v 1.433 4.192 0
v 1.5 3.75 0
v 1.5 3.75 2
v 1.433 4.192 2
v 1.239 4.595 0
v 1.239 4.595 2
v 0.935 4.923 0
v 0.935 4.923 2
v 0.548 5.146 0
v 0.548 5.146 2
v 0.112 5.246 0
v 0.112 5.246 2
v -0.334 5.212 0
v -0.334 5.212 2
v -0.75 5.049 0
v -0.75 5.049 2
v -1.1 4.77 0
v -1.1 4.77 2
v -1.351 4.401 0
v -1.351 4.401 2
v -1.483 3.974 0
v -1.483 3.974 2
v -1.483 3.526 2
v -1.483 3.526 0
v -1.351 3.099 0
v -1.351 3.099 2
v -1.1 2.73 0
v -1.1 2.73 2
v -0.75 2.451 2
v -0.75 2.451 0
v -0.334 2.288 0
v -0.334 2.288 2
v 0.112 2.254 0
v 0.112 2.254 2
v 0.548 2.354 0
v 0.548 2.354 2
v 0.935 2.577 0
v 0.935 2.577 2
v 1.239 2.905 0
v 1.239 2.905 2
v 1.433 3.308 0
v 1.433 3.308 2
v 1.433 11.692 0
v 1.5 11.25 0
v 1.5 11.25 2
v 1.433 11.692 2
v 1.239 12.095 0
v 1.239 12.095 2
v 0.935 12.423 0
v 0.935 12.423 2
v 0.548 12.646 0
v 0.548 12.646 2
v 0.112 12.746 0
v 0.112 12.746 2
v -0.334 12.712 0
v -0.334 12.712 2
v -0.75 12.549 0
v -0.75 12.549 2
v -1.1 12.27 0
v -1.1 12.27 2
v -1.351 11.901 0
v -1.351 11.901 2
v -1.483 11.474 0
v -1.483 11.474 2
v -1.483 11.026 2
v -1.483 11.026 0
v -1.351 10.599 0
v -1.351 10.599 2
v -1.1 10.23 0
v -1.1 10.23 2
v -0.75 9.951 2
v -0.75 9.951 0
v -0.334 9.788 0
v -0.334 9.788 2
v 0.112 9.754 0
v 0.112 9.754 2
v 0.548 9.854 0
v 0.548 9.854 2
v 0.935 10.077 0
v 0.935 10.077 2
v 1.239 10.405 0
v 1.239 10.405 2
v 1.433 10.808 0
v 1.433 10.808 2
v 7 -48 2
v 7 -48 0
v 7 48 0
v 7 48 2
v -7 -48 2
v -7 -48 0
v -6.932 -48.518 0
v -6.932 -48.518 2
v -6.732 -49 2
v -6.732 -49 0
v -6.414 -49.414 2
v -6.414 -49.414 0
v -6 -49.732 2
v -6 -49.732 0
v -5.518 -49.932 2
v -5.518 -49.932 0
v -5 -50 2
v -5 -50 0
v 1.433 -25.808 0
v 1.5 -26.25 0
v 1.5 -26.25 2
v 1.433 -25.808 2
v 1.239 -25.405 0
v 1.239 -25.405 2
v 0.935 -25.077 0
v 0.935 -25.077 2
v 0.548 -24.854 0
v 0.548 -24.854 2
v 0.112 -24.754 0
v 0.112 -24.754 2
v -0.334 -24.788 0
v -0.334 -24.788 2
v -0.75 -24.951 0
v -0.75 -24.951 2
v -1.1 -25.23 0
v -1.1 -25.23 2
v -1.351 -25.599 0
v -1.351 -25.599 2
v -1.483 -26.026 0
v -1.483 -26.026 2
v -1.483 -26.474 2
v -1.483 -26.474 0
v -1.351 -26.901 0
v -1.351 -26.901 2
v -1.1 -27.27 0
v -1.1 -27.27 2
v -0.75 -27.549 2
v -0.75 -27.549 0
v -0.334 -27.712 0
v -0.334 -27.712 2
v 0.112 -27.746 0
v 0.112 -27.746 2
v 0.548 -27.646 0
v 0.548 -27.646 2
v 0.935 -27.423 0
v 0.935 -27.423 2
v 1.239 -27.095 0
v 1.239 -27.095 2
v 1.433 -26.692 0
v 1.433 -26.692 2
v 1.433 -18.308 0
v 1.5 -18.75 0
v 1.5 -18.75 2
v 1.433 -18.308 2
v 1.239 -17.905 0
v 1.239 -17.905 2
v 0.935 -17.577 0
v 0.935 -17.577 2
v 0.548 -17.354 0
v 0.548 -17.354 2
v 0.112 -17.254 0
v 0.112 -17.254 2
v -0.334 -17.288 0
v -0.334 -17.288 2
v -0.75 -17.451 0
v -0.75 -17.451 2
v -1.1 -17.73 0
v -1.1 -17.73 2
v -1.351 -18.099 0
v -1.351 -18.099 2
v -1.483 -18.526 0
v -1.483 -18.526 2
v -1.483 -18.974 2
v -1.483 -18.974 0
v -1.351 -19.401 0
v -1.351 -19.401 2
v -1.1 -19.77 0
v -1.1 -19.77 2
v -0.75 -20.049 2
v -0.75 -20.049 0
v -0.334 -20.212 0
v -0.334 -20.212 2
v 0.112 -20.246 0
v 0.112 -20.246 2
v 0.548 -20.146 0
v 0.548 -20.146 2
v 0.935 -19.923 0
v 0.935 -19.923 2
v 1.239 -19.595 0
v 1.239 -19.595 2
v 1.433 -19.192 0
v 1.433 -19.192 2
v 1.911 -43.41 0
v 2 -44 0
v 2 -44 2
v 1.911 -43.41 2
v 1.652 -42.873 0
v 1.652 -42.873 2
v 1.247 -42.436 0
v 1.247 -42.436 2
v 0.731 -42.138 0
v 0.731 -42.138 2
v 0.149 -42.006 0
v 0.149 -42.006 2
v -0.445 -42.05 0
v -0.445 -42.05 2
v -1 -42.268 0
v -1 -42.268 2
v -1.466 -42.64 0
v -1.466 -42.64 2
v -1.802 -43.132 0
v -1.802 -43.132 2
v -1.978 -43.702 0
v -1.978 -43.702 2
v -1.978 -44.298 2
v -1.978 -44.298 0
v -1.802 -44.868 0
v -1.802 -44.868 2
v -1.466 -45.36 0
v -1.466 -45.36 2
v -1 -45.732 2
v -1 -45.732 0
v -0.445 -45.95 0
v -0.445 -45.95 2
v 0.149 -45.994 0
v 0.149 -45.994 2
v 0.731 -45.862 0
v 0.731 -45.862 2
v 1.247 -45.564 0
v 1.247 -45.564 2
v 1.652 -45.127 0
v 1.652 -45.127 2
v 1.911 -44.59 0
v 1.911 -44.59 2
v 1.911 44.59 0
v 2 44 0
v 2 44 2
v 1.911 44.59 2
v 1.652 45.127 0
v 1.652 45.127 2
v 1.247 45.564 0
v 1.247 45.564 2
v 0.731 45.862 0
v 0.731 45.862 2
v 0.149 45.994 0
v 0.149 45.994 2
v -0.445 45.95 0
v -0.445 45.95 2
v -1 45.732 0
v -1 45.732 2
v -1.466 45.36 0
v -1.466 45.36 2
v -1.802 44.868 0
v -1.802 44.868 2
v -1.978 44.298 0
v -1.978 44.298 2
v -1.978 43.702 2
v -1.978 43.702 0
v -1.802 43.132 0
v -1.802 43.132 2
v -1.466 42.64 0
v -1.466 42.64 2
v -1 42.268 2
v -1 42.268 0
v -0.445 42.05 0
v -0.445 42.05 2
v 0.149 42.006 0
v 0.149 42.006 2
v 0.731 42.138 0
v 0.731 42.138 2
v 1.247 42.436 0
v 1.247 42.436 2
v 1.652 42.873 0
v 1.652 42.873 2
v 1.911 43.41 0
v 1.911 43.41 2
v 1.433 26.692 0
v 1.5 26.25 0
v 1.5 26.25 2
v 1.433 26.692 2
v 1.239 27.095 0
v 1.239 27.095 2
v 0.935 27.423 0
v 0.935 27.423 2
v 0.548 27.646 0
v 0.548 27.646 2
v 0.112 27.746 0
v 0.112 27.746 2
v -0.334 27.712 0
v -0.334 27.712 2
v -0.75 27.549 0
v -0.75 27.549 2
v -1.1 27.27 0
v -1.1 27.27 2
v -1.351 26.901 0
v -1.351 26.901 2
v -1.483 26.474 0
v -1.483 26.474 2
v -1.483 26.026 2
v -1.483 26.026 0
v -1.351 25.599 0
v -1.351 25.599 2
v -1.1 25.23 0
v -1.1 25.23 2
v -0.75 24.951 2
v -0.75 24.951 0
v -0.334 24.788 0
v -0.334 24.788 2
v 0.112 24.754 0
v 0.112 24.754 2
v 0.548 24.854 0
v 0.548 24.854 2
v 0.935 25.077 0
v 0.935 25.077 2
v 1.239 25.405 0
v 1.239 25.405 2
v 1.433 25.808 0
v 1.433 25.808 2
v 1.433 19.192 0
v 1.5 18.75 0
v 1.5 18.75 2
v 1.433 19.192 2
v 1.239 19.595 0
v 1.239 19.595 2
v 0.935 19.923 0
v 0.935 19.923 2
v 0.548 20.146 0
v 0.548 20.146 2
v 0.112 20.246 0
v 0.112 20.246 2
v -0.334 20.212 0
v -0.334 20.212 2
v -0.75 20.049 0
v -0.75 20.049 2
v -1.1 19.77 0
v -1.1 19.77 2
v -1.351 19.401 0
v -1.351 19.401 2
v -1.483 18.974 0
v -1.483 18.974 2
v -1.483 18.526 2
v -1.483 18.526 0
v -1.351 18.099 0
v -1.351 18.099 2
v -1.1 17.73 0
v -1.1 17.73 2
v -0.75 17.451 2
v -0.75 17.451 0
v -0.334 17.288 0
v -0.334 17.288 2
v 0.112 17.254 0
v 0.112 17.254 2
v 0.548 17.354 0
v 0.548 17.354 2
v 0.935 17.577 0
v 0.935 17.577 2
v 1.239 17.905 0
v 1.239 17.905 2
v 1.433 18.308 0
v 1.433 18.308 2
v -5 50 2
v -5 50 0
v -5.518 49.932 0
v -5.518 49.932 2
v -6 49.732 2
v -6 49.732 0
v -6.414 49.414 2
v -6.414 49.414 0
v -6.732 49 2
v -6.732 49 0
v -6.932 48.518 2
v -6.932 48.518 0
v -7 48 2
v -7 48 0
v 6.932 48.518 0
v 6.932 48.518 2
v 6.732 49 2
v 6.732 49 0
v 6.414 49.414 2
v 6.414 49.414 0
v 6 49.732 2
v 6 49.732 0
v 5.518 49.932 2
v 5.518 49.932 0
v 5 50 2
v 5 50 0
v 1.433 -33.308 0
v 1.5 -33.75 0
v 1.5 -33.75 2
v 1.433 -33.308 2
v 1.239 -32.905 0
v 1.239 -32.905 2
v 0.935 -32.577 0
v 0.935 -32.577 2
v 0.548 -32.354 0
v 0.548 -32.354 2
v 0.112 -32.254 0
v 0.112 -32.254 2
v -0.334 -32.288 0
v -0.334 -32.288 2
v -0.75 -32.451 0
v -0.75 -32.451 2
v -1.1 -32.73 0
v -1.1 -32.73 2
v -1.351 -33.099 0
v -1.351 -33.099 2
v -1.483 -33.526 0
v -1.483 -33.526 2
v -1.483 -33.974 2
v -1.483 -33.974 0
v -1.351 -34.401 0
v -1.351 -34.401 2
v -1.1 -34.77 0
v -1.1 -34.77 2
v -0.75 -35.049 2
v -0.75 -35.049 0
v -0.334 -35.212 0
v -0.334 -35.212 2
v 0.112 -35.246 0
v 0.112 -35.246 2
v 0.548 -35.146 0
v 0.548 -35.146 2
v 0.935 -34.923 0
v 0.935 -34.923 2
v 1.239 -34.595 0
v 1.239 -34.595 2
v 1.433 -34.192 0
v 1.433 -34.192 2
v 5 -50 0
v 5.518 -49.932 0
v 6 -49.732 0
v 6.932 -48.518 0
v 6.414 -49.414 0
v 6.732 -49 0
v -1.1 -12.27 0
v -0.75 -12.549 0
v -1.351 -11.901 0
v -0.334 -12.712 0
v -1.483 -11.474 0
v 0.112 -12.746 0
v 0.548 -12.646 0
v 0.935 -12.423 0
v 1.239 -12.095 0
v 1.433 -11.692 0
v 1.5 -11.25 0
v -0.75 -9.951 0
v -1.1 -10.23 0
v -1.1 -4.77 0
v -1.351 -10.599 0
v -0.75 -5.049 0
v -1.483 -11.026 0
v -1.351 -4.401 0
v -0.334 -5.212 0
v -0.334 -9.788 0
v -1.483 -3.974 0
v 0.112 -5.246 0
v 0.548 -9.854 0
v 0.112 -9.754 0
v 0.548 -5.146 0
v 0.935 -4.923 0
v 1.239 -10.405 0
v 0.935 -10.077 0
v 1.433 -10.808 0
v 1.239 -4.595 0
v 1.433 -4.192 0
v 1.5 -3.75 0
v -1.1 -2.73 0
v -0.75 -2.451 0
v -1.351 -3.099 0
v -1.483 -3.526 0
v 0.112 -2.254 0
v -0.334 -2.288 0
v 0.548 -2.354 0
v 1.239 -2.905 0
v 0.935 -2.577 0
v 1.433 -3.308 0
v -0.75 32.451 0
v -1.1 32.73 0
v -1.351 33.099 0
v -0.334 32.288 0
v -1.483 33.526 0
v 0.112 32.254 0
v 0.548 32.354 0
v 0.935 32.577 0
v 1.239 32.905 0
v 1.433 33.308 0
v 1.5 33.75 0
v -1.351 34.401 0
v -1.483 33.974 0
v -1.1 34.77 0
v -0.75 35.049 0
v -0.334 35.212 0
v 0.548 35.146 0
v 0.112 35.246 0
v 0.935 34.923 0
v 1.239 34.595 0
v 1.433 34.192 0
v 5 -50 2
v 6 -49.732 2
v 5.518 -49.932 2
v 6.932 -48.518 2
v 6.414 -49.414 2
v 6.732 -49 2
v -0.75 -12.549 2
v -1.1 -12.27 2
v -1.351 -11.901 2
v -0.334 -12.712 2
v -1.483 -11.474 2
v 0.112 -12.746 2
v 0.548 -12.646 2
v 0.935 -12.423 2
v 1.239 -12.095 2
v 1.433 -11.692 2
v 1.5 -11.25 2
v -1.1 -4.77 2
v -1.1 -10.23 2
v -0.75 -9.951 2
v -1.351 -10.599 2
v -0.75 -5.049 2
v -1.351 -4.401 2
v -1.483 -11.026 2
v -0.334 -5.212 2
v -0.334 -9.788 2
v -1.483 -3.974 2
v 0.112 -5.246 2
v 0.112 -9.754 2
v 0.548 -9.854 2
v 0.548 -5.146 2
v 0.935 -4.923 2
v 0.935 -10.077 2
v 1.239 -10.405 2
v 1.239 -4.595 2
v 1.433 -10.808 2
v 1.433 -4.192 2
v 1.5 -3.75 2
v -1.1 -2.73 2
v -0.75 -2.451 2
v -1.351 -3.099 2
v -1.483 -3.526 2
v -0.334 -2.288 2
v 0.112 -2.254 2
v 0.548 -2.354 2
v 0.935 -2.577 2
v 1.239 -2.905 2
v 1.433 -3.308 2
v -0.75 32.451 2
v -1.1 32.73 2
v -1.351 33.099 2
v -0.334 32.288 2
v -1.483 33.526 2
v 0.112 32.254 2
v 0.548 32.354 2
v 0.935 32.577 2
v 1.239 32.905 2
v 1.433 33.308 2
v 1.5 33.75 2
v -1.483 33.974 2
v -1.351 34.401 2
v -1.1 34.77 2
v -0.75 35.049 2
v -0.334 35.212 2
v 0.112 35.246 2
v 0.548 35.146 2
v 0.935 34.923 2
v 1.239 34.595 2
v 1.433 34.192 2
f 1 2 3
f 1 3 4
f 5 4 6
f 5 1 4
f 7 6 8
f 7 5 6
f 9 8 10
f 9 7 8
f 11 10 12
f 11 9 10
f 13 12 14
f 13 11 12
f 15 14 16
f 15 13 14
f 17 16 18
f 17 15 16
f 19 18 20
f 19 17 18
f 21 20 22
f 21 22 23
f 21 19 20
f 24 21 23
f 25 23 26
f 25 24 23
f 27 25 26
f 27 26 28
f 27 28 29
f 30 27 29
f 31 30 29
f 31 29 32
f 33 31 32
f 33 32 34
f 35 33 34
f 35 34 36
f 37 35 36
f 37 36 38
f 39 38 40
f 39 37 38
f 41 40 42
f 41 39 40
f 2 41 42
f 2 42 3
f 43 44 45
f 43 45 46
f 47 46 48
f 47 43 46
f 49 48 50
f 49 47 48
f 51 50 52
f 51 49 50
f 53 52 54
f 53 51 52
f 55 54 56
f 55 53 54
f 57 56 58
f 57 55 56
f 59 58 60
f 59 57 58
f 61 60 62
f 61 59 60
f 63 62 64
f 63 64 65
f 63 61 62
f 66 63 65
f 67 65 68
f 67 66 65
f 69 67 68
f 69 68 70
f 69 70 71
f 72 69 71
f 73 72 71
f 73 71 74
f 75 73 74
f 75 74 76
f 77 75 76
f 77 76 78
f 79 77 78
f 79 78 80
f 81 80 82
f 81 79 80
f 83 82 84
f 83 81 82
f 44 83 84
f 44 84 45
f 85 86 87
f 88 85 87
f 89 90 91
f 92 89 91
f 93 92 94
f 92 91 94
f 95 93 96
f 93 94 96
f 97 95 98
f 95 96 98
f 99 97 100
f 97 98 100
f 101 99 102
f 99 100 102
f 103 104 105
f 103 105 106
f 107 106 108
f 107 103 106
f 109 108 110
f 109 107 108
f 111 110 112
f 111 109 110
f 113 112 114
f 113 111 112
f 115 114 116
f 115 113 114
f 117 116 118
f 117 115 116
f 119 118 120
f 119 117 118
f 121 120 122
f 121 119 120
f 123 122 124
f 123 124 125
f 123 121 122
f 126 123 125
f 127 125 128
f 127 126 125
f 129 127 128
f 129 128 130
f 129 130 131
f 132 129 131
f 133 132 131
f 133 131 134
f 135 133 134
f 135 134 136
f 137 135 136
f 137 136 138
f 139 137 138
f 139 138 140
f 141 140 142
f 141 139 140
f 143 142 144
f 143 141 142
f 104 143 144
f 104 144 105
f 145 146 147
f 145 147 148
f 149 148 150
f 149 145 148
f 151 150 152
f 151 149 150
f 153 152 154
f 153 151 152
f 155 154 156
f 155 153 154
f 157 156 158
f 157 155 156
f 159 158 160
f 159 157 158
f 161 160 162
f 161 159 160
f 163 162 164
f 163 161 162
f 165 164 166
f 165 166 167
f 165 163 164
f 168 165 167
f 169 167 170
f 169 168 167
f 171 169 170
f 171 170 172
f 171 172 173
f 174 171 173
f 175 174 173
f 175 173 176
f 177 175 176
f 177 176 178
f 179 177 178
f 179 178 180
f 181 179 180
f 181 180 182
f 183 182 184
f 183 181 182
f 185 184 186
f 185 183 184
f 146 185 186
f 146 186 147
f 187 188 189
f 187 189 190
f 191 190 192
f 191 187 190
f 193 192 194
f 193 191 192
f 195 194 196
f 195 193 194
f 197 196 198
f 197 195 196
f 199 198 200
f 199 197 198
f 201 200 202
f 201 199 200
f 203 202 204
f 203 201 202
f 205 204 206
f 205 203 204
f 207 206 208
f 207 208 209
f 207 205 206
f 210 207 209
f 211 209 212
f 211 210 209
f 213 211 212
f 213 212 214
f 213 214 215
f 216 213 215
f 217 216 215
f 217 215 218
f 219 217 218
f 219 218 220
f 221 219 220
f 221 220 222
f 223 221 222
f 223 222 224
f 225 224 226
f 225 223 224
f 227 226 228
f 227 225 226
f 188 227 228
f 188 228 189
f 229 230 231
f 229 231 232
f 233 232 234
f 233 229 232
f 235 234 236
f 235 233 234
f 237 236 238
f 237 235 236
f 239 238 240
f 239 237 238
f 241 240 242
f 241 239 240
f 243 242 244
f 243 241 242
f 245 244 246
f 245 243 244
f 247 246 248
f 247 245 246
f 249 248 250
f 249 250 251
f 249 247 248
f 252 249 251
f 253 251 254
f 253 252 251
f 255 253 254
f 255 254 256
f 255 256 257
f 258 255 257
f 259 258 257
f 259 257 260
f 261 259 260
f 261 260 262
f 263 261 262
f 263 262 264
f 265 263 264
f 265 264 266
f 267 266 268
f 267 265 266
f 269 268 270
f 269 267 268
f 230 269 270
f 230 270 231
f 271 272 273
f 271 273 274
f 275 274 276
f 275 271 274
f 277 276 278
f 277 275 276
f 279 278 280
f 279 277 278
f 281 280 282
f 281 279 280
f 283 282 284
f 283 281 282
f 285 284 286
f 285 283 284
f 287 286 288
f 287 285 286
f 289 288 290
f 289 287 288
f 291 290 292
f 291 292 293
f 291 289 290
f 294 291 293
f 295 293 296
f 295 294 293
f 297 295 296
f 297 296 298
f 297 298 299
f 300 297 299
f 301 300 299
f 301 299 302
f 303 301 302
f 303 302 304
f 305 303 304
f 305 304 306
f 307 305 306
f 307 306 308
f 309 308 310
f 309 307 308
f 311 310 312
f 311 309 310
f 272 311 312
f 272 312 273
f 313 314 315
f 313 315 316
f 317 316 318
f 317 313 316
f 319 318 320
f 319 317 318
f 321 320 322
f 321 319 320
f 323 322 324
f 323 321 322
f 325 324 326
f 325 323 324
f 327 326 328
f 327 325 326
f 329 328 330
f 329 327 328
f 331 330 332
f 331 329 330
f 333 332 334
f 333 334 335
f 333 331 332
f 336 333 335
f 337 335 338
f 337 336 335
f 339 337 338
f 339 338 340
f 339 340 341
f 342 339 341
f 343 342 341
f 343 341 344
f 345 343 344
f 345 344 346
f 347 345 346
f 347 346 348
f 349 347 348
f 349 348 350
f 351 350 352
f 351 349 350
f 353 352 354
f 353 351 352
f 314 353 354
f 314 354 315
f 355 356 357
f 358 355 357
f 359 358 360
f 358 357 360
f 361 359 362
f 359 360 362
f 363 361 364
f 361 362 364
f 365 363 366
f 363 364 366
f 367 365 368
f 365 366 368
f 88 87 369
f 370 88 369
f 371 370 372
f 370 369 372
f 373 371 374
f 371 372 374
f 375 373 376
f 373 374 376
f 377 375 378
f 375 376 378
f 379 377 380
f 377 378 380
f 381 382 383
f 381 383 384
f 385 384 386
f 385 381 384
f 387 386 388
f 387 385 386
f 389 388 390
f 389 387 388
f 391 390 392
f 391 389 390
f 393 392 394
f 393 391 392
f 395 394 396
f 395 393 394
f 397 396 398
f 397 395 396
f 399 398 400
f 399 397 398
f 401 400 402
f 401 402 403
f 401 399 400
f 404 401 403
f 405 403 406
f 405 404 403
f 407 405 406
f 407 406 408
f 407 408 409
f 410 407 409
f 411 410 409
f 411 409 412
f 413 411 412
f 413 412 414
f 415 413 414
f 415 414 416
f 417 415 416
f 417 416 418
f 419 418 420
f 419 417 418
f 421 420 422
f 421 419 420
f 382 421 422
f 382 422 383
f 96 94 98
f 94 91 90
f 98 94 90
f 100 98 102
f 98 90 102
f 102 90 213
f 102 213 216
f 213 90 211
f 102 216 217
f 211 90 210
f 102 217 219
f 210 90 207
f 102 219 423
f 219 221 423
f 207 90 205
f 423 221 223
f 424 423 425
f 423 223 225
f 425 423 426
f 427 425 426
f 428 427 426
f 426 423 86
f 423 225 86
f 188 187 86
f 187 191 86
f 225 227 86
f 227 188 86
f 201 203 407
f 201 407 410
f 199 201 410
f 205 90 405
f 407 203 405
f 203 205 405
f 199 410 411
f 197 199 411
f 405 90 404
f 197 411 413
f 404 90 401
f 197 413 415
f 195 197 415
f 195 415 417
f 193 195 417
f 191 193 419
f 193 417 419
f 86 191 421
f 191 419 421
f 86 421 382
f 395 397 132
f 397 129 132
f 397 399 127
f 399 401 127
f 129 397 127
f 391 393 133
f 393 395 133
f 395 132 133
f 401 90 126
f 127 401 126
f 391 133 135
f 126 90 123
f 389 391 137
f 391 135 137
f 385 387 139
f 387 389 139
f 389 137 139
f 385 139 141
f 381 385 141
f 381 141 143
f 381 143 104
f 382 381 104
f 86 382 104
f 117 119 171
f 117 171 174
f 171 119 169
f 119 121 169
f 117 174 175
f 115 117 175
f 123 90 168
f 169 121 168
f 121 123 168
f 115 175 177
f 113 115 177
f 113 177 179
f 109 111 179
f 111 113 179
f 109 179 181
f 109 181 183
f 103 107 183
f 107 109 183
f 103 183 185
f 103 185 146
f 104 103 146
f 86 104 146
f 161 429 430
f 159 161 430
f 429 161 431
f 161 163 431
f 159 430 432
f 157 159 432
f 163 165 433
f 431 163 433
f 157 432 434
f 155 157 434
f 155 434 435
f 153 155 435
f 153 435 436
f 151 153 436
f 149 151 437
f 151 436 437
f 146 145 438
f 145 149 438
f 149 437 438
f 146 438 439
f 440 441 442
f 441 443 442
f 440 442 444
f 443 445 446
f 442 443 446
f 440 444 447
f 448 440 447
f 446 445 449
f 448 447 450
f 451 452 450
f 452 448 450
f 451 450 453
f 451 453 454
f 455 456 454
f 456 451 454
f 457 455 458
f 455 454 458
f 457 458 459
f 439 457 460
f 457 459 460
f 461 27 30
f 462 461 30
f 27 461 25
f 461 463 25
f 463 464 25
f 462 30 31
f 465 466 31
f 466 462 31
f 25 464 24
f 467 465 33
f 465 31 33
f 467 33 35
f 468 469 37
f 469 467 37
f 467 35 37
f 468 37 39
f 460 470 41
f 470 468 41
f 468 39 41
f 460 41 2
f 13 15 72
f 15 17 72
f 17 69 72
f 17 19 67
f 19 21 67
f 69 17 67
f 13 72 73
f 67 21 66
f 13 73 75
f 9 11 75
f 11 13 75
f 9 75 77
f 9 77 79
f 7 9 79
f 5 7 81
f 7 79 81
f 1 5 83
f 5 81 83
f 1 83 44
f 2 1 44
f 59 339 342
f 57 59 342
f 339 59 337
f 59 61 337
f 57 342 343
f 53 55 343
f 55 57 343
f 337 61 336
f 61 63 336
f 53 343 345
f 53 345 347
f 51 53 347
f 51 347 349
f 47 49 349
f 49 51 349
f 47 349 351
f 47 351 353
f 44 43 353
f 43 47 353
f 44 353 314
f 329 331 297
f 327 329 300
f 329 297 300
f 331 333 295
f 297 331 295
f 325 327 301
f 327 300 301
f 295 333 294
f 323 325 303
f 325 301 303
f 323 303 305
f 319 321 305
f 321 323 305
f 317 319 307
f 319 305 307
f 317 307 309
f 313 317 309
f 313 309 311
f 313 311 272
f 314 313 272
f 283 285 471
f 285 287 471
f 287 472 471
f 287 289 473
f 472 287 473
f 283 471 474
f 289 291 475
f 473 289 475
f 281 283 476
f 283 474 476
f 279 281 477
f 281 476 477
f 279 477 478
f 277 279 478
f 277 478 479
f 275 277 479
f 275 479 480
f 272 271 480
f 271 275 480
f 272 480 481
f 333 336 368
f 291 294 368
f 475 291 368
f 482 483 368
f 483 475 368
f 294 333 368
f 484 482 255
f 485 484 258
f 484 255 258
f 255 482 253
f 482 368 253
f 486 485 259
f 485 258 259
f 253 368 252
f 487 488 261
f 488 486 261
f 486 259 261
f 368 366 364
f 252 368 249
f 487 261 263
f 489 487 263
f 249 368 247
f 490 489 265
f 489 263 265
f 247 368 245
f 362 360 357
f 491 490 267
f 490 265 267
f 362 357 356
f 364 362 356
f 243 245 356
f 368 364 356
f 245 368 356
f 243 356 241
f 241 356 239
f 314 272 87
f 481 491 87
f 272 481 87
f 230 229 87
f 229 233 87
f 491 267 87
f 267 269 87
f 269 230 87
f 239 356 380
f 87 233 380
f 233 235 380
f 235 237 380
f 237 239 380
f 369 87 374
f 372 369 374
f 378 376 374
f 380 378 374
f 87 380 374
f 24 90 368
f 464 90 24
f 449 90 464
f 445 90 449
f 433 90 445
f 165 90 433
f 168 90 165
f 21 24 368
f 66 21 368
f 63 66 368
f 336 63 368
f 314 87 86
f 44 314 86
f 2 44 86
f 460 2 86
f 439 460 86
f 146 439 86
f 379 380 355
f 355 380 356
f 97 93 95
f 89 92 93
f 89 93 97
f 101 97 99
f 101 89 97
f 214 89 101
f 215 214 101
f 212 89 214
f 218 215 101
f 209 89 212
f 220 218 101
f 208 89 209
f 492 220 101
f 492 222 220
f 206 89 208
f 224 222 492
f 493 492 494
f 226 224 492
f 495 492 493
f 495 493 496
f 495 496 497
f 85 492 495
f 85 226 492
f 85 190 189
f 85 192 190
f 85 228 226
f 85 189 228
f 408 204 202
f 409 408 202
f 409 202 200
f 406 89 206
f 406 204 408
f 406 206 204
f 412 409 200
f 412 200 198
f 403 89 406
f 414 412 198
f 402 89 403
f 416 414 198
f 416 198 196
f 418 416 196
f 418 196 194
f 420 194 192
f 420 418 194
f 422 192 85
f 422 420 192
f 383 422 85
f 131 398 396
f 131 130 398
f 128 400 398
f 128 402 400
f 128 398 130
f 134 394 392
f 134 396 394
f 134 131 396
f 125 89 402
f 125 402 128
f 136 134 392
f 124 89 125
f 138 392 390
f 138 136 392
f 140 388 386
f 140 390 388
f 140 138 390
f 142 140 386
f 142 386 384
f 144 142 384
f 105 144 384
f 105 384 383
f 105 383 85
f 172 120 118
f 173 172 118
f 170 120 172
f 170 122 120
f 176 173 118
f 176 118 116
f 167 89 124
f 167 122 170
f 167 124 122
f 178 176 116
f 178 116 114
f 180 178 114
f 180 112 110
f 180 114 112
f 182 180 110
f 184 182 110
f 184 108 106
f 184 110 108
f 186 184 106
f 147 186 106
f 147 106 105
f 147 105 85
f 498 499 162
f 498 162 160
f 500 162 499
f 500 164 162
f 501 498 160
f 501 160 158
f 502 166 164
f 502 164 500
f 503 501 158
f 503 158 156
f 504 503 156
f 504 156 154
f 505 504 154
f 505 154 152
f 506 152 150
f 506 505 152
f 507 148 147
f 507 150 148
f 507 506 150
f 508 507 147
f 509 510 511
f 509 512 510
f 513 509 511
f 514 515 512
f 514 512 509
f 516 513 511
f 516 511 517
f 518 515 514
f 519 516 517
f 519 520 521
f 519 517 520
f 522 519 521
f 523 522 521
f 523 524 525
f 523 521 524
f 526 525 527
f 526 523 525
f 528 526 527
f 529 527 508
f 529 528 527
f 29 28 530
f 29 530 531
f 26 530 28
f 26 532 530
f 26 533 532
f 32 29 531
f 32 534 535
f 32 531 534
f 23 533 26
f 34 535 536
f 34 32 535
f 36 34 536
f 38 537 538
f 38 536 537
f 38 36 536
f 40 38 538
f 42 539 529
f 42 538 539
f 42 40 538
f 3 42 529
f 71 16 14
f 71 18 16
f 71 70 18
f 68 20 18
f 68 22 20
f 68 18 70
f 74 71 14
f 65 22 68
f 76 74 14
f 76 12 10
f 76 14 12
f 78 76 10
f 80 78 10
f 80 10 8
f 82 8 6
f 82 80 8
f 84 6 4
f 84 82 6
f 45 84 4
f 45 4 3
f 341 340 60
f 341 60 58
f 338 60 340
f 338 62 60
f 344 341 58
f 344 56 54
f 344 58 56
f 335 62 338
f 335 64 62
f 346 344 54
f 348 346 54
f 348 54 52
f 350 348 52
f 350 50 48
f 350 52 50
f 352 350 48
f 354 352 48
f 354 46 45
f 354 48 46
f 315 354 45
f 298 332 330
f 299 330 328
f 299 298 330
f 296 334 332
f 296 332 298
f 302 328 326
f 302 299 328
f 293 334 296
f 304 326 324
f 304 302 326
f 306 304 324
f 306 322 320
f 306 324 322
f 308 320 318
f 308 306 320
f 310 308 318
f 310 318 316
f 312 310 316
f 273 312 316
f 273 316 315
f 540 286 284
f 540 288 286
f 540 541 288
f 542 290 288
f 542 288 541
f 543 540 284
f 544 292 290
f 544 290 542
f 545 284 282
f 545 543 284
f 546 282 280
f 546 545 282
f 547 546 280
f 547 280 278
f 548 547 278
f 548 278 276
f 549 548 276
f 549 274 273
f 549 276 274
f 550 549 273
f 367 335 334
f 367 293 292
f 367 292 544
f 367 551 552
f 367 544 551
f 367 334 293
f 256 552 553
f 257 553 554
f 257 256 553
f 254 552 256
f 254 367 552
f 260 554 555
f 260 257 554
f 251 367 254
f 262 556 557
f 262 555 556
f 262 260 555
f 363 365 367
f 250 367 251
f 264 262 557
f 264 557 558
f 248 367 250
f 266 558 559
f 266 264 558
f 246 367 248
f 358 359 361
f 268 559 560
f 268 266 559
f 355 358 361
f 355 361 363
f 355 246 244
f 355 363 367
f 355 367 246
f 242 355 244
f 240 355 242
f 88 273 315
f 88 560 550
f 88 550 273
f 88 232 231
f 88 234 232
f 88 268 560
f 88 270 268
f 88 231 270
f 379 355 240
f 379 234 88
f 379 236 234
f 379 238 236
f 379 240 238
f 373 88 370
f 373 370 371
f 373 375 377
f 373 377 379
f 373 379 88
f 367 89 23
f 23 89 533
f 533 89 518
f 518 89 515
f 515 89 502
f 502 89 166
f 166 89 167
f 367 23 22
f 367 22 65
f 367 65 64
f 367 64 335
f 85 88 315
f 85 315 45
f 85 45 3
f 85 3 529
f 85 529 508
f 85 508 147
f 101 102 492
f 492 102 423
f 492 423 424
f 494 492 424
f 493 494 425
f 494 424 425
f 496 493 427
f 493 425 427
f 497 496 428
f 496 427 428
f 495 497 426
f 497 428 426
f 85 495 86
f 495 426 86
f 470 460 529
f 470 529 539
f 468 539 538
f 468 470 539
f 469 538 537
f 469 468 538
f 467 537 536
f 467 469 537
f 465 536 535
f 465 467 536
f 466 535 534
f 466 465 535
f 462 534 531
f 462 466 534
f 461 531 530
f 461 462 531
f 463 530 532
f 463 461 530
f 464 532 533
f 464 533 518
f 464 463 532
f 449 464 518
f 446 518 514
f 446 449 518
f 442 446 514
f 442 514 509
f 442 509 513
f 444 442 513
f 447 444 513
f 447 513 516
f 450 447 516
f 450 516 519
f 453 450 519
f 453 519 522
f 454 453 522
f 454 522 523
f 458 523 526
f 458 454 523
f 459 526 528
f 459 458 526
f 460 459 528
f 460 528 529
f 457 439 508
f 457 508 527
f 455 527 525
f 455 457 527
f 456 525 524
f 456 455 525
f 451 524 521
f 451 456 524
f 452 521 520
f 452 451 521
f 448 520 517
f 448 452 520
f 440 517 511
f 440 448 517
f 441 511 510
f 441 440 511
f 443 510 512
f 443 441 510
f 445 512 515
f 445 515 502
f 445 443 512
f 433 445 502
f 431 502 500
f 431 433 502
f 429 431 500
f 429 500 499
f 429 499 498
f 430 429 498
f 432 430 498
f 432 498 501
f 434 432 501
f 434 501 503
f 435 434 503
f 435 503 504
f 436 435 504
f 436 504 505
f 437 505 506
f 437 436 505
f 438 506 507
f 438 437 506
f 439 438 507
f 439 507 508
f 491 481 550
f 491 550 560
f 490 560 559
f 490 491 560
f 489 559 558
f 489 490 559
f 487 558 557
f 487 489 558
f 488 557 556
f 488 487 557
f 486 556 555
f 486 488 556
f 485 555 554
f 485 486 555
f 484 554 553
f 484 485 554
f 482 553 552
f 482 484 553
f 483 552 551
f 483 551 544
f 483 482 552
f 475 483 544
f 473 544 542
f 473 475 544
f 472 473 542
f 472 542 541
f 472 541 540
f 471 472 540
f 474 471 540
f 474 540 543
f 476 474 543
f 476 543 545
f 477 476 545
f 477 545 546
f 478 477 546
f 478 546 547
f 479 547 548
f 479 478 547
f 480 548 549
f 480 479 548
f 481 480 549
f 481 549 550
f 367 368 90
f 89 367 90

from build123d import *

# Parameters (mm, degrees)
F0_R     = 2
F0_R_2   = 1.5
F1_DEPTH = 2


with BuildPart() as f1:
    # F0 (on Top) → F1 (new body)
    with BuildSketch(Plane.XY):
        with BuildLine():
            ThreePointArc((7, 48), (6.414214, 49.414214), (5, 50))
            Line((5, 50), (-5, 50))
            ThreePointArc((-5, 50), (-6.414214, 49.414214), (-7, 48))
            Line((-7, 48), (-7, -48))
            ThreePointArc((-7, -48), (-6.414214, -49.414214), (-5, -50))
            Line((-5, -50), (5, -50))
            ThreePointArc((5, -50), (6.414214, -49.414214), (7, -48))
            Line((7, -48), (7, 48))
        make_face()
        with Locations((0, -44)):
            Circle(F0_R, mode=Mode.SUBTRACT)
        with Locations((0, -33.75)):
            Circle(F0_R_2, mode=Mode.SUBTRACT)
        with Locations((0, -26.25)):
            Circle(F0_R_2, mode=Mode.SUBTRACT)
        with Locations((0, -18.75)):
            Circle(F0_R_2, mode=Mode.SUBTRACT)
        with Locations((0, -11.25)):
            Circle(F0_R_2, mode=Mode.SUBTRACT)
        with Locations((0, -3.75)):
            Circle(F0_R_2, mode=Mode.SUBTRACT)
        with Locations((0, 3.75)):
            Circle(F0_R_2, mode=Mode.SUBTRACT)
        with Locations((0, 11.25)):
            Circle(F0_R_2, mode=Mode.SUBTRACT)
        with Locations((0, 18.75)):
            Circle(F0_R_2, mode=Mode.SUBTRACT)
        with Locations((0, 26.25)):
            Circle(F0_R_2, mode=Mode.SUBTRACT)
        with Locations((0, 33.75)):
            Circle(F0_R_2, mode=Mode.SUBTRACT)
        with Locations((0, 44)):
            Circle(F0_R, mode=Mode.SUBTRACT)
    extrude(amount=F1_DEPTH)


solid = f1.part
